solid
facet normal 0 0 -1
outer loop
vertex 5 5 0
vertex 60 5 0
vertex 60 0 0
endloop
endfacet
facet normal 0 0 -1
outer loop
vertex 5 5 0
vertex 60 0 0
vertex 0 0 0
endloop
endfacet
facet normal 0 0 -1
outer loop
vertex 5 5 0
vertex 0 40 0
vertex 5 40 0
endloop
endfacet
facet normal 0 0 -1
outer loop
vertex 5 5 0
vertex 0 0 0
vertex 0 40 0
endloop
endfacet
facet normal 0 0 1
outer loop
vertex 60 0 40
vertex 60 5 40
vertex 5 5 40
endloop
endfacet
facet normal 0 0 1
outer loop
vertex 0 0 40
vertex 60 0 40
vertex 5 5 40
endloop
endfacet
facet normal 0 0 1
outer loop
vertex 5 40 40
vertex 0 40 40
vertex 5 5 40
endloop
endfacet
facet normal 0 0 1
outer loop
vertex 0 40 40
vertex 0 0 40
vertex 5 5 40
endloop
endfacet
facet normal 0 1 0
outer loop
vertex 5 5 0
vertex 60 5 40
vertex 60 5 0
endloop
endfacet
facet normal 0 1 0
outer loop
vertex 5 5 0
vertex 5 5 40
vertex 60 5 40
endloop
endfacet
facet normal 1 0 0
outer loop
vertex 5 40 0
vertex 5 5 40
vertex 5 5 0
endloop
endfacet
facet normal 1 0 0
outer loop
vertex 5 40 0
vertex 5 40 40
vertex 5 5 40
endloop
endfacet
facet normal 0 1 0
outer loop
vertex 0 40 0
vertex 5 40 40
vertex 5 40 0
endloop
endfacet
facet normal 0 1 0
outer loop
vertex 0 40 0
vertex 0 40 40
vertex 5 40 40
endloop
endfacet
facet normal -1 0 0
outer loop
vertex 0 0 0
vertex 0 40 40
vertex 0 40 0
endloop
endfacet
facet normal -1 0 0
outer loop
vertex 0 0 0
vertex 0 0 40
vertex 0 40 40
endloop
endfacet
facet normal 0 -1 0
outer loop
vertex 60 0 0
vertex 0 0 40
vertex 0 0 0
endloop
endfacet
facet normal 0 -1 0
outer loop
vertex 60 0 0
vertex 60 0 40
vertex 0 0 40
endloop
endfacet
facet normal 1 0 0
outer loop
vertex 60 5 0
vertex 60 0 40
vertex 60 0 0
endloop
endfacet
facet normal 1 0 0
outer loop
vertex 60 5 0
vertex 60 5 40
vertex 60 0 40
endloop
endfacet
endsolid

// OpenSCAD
$fn = 32;

// ----------------------------------------------------------------------
// Structural section: angle 60 x 40 mm
// ----------------------------------------------------------------------

// --- parameters (mm) ---
sec_w = 60;               // leg width, X
sec_h = 40;               // leg height, Y
flange_t = 5;             // leg thickness
plate_t = 40;             // cut length, Z (extrusion height)

profile = [[0, 0], [60, 0], [60, 5], [5, 5], [5, 40], [0, 40]];  // primary outline, 6 points, counter clockwise

// --- the one profile operation ---
linear_extrude(height = plate_t) polygon(points = profile);
